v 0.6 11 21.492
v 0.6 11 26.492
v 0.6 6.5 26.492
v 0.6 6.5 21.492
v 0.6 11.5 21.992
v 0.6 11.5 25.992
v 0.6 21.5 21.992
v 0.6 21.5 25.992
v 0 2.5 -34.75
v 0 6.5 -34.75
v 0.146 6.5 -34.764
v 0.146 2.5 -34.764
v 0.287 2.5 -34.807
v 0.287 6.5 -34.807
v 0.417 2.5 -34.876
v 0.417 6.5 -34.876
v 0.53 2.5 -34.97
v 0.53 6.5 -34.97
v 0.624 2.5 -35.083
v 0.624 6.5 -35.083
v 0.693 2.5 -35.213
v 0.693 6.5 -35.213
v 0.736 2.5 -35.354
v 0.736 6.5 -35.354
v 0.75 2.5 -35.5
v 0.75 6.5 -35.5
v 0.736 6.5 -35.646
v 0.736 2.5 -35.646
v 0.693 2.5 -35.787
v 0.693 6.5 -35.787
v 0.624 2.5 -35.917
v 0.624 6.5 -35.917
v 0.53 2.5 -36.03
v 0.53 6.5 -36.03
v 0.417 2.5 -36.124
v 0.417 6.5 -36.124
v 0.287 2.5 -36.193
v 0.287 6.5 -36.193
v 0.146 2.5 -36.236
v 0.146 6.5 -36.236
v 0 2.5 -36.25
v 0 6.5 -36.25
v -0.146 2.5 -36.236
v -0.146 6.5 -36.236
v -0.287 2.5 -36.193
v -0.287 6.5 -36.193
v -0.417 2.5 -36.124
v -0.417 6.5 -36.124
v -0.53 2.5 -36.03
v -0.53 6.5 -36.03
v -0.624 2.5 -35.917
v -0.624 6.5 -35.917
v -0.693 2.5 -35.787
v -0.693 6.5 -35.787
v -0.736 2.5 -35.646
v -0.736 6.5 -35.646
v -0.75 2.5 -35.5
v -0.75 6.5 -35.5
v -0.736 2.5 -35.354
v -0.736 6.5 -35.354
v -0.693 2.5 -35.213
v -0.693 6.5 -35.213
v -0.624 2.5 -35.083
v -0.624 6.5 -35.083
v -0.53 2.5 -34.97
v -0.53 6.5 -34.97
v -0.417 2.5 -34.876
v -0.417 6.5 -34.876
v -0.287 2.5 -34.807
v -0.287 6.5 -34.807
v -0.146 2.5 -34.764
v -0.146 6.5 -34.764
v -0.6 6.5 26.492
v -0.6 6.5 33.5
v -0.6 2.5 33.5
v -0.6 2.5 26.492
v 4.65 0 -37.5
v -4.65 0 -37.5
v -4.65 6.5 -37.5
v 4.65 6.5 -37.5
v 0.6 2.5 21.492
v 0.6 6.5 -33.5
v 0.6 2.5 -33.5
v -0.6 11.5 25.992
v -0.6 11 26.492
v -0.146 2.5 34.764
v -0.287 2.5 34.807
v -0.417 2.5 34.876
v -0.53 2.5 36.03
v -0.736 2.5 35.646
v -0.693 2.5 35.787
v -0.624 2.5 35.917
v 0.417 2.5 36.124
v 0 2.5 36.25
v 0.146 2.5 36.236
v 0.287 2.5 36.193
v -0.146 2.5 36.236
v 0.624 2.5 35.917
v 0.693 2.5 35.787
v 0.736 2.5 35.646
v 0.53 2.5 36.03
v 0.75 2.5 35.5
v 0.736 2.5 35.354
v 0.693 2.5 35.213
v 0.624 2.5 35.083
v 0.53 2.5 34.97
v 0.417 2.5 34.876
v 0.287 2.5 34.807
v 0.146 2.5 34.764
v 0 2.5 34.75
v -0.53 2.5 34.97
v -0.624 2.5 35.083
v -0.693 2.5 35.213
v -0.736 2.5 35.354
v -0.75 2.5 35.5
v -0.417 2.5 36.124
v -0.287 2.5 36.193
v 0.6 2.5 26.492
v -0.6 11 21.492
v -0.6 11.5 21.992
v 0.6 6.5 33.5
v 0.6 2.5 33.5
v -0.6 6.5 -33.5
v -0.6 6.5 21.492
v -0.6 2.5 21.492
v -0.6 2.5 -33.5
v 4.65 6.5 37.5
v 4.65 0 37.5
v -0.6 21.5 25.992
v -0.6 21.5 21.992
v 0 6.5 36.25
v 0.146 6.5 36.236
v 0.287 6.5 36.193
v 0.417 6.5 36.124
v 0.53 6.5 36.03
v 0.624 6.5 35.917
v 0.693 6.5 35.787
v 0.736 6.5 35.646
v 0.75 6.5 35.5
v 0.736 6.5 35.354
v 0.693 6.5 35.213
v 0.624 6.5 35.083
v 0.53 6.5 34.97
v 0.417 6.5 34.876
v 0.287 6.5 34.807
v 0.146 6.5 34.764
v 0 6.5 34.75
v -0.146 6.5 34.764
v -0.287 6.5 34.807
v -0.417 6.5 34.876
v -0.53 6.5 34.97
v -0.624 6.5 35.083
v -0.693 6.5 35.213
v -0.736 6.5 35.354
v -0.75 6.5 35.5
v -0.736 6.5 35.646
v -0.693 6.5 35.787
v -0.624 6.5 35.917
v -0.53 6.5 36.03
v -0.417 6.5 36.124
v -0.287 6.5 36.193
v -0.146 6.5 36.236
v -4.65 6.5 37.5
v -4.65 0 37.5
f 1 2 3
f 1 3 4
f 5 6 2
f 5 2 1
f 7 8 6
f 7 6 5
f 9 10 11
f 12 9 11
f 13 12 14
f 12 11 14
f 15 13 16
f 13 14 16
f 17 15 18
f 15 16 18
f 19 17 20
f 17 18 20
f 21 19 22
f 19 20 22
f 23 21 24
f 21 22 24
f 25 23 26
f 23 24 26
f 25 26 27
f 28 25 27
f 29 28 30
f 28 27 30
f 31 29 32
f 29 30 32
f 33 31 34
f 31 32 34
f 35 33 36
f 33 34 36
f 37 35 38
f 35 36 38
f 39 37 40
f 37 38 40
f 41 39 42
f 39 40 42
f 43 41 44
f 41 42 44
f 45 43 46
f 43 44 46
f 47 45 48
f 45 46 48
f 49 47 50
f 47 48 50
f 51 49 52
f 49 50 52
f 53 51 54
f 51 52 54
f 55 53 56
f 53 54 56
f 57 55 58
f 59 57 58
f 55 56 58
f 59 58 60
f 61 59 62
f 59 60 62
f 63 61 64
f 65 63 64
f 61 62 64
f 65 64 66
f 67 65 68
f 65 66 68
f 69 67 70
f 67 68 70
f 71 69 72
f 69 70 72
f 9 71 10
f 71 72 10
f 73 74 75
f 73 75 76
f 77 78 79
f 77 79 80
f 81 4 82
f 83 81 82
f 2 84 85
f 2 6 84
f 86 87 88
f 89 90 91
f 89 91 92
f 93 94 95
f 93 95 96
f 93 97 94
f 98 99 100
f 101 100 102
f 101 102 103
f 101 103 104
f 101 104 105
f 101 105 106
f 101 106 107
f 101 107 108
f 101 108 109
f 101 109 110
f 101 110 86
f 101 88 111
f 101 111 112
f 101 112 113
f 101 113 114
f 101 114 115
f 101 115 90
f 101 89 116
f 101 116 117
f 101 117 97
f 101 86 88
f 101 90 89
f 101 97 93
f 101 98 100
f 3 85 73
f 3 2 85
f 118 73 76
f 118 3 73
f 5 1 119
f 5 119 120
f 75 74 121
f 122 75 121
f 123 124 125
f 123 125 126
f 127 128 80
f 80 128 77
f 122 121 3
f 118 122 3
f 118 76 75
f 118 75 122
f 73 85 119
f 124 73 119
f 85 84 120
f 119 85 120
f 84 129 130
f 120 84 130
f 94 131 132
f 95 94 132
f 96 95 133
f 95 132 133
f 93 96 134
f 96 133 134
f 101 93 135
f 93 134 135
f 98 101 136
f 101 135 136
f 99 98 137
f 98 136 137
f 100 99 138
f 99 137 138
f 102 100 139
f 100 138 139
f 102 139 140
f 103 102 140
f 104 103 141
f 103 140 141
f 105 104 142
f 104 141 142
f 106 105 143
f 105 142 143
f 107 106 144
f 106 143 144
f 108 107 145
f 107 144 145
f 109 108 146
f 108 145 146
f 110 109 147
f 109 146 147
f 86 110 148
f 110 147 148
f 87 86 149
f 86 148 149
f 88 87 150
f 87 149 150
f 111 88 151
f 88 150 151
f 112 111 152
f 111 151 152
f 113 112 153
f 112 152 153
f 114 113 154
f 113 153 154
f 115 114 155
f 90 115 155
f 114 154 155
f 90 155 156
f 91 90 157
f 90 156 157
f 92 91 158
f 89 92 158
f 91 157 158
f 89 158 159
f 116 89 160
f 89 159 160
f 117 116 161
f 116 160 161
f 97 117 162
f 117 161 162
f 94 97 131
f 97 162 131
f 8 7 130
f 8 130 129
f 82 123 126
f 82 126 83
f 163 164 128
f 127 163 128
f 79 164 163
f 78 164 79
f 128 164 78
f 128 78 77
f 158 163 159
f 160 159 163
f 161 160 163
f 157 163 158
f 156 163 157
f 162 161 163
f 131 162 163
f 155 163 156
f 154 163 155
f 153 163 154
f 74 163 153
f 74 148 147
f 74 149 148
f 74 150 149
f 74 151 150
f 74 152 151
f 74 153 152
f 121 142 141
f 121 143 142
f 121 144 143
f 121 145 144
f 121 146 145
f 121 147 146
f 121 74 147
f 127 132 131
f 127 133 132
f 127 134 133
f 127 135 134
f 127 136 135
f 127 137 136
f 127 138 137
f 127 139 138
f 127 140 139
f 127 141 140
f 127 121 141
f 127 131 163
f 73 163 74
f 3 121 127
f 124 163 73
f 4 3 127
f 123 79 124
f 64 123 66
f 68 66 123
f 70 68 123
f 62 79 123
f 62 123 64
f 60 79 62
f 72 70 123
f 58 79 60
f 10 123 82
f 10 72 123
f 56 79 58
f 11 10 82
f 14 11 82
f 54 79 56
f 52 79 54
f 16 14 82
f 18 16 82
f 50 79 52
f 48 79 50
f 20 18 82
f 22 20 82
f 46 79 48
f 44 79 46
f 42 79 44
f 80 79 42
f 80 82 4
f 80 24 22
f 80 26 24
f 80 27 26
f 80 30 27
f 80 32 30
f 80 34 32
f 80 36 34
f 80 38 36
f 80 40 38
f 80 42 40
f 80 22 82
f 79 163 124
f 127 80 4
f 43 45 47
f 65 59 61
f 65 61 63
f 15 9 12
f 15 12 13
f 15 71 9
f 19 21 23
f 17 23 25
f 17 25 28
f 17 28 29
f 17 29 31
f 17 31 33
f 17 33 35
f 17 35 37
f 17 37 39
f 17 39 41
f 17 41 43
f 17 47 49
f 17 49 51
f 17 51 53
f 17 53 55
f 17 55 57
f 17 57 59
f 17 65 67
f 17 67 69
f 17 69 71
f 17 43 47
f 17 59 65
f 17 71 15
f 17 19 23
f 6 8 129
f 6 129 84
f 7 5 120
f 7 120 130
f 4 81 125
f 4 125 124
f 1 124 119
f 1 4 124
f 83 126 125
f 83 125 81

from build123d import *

# Parameters (mm, degrees)
ESQUISSE1_W             = 9.3
ESQUISSE1_H             = 75
BOSS_EXTRU_1_DEPTH      = 6.5
ESQUISSE2_R             = 0.75
ENL_V_MAT_EXTRU_1_DEPTH = 4
ESQUISSE3_W             = 1.2
ESQUISSE3_H             = 67
ENL_V_MAT_EXTRU_2_DEPTH = 4
BOSS_EXTRU_2_DEPTH      = 0.6


with BuildPart() as part:
    # Esquisse1 → Boss.-Extru.1 (new body)
    with BuildSketch(Plane(origin=(0, 0, 0), x_dir=(1, 0, 0), z_dir=(0, 1, 0))):
        Rectangle(ESQUISSE1_W, ESQUISSE1_H)
    extrude(amount=BOSS_EXTRU_1_DEPTH)

    # Esquisse2 → Enlèv. mat.-Extru.1 (cut)
    with BuildSketch(Plane(origin=(0, 6.5, 0), x_dir=(1, 0, 0), z_dir=(0, 1, 0))):
        with Locations(Location((0, 35.5, 0), (0, 0, 270))):
            Circle(ESQUISSE2_R)
        with Locations(Location((0, -35.5, 0), (0, 0, 270))):
            Circle(ESQUISSE2_R)
    extrude(amount=-ENL_V_MAT_EXTRU_1_DEPTH, mode=Mode.SUBTRACT)

    # Esquisse3 → Enlèv. mat.-Extru.2 (cut)
    with BuildSketch(Plane(origin=(0, 6.5, 0), x_dir=(1, 0, 0), z_dir=(0, 1, 0))):
        Rectangle(ESQUISSE3_W, ESQUISSE3_H)
    extrude(amount=-ENL_V_MAT_EXTRU_2_DEPTH, mode=Mode.SUBTRACT)

    # Esquisse4 → Boss.-Extru.2 (add, symmetric)
    with BuildSketch(Plane(origin=(0, 0, 0), x_dir=(0, 0, -1), z_dir=(1, 0, 0))):
        Polygon((-26.491586963, 2.5), (-21.491586963, 2.5), (-21.491586963, 11), (-21.991586963, 11.5), (-21.991586963, 21.5), (-25.991586963, 21.5), (-25.991586963, 11.5), (-26.491586963, 11), align=None)
    extrude(amount=BOSS_EXTRU_2_DEPTH, both=True)


solid = part.part
